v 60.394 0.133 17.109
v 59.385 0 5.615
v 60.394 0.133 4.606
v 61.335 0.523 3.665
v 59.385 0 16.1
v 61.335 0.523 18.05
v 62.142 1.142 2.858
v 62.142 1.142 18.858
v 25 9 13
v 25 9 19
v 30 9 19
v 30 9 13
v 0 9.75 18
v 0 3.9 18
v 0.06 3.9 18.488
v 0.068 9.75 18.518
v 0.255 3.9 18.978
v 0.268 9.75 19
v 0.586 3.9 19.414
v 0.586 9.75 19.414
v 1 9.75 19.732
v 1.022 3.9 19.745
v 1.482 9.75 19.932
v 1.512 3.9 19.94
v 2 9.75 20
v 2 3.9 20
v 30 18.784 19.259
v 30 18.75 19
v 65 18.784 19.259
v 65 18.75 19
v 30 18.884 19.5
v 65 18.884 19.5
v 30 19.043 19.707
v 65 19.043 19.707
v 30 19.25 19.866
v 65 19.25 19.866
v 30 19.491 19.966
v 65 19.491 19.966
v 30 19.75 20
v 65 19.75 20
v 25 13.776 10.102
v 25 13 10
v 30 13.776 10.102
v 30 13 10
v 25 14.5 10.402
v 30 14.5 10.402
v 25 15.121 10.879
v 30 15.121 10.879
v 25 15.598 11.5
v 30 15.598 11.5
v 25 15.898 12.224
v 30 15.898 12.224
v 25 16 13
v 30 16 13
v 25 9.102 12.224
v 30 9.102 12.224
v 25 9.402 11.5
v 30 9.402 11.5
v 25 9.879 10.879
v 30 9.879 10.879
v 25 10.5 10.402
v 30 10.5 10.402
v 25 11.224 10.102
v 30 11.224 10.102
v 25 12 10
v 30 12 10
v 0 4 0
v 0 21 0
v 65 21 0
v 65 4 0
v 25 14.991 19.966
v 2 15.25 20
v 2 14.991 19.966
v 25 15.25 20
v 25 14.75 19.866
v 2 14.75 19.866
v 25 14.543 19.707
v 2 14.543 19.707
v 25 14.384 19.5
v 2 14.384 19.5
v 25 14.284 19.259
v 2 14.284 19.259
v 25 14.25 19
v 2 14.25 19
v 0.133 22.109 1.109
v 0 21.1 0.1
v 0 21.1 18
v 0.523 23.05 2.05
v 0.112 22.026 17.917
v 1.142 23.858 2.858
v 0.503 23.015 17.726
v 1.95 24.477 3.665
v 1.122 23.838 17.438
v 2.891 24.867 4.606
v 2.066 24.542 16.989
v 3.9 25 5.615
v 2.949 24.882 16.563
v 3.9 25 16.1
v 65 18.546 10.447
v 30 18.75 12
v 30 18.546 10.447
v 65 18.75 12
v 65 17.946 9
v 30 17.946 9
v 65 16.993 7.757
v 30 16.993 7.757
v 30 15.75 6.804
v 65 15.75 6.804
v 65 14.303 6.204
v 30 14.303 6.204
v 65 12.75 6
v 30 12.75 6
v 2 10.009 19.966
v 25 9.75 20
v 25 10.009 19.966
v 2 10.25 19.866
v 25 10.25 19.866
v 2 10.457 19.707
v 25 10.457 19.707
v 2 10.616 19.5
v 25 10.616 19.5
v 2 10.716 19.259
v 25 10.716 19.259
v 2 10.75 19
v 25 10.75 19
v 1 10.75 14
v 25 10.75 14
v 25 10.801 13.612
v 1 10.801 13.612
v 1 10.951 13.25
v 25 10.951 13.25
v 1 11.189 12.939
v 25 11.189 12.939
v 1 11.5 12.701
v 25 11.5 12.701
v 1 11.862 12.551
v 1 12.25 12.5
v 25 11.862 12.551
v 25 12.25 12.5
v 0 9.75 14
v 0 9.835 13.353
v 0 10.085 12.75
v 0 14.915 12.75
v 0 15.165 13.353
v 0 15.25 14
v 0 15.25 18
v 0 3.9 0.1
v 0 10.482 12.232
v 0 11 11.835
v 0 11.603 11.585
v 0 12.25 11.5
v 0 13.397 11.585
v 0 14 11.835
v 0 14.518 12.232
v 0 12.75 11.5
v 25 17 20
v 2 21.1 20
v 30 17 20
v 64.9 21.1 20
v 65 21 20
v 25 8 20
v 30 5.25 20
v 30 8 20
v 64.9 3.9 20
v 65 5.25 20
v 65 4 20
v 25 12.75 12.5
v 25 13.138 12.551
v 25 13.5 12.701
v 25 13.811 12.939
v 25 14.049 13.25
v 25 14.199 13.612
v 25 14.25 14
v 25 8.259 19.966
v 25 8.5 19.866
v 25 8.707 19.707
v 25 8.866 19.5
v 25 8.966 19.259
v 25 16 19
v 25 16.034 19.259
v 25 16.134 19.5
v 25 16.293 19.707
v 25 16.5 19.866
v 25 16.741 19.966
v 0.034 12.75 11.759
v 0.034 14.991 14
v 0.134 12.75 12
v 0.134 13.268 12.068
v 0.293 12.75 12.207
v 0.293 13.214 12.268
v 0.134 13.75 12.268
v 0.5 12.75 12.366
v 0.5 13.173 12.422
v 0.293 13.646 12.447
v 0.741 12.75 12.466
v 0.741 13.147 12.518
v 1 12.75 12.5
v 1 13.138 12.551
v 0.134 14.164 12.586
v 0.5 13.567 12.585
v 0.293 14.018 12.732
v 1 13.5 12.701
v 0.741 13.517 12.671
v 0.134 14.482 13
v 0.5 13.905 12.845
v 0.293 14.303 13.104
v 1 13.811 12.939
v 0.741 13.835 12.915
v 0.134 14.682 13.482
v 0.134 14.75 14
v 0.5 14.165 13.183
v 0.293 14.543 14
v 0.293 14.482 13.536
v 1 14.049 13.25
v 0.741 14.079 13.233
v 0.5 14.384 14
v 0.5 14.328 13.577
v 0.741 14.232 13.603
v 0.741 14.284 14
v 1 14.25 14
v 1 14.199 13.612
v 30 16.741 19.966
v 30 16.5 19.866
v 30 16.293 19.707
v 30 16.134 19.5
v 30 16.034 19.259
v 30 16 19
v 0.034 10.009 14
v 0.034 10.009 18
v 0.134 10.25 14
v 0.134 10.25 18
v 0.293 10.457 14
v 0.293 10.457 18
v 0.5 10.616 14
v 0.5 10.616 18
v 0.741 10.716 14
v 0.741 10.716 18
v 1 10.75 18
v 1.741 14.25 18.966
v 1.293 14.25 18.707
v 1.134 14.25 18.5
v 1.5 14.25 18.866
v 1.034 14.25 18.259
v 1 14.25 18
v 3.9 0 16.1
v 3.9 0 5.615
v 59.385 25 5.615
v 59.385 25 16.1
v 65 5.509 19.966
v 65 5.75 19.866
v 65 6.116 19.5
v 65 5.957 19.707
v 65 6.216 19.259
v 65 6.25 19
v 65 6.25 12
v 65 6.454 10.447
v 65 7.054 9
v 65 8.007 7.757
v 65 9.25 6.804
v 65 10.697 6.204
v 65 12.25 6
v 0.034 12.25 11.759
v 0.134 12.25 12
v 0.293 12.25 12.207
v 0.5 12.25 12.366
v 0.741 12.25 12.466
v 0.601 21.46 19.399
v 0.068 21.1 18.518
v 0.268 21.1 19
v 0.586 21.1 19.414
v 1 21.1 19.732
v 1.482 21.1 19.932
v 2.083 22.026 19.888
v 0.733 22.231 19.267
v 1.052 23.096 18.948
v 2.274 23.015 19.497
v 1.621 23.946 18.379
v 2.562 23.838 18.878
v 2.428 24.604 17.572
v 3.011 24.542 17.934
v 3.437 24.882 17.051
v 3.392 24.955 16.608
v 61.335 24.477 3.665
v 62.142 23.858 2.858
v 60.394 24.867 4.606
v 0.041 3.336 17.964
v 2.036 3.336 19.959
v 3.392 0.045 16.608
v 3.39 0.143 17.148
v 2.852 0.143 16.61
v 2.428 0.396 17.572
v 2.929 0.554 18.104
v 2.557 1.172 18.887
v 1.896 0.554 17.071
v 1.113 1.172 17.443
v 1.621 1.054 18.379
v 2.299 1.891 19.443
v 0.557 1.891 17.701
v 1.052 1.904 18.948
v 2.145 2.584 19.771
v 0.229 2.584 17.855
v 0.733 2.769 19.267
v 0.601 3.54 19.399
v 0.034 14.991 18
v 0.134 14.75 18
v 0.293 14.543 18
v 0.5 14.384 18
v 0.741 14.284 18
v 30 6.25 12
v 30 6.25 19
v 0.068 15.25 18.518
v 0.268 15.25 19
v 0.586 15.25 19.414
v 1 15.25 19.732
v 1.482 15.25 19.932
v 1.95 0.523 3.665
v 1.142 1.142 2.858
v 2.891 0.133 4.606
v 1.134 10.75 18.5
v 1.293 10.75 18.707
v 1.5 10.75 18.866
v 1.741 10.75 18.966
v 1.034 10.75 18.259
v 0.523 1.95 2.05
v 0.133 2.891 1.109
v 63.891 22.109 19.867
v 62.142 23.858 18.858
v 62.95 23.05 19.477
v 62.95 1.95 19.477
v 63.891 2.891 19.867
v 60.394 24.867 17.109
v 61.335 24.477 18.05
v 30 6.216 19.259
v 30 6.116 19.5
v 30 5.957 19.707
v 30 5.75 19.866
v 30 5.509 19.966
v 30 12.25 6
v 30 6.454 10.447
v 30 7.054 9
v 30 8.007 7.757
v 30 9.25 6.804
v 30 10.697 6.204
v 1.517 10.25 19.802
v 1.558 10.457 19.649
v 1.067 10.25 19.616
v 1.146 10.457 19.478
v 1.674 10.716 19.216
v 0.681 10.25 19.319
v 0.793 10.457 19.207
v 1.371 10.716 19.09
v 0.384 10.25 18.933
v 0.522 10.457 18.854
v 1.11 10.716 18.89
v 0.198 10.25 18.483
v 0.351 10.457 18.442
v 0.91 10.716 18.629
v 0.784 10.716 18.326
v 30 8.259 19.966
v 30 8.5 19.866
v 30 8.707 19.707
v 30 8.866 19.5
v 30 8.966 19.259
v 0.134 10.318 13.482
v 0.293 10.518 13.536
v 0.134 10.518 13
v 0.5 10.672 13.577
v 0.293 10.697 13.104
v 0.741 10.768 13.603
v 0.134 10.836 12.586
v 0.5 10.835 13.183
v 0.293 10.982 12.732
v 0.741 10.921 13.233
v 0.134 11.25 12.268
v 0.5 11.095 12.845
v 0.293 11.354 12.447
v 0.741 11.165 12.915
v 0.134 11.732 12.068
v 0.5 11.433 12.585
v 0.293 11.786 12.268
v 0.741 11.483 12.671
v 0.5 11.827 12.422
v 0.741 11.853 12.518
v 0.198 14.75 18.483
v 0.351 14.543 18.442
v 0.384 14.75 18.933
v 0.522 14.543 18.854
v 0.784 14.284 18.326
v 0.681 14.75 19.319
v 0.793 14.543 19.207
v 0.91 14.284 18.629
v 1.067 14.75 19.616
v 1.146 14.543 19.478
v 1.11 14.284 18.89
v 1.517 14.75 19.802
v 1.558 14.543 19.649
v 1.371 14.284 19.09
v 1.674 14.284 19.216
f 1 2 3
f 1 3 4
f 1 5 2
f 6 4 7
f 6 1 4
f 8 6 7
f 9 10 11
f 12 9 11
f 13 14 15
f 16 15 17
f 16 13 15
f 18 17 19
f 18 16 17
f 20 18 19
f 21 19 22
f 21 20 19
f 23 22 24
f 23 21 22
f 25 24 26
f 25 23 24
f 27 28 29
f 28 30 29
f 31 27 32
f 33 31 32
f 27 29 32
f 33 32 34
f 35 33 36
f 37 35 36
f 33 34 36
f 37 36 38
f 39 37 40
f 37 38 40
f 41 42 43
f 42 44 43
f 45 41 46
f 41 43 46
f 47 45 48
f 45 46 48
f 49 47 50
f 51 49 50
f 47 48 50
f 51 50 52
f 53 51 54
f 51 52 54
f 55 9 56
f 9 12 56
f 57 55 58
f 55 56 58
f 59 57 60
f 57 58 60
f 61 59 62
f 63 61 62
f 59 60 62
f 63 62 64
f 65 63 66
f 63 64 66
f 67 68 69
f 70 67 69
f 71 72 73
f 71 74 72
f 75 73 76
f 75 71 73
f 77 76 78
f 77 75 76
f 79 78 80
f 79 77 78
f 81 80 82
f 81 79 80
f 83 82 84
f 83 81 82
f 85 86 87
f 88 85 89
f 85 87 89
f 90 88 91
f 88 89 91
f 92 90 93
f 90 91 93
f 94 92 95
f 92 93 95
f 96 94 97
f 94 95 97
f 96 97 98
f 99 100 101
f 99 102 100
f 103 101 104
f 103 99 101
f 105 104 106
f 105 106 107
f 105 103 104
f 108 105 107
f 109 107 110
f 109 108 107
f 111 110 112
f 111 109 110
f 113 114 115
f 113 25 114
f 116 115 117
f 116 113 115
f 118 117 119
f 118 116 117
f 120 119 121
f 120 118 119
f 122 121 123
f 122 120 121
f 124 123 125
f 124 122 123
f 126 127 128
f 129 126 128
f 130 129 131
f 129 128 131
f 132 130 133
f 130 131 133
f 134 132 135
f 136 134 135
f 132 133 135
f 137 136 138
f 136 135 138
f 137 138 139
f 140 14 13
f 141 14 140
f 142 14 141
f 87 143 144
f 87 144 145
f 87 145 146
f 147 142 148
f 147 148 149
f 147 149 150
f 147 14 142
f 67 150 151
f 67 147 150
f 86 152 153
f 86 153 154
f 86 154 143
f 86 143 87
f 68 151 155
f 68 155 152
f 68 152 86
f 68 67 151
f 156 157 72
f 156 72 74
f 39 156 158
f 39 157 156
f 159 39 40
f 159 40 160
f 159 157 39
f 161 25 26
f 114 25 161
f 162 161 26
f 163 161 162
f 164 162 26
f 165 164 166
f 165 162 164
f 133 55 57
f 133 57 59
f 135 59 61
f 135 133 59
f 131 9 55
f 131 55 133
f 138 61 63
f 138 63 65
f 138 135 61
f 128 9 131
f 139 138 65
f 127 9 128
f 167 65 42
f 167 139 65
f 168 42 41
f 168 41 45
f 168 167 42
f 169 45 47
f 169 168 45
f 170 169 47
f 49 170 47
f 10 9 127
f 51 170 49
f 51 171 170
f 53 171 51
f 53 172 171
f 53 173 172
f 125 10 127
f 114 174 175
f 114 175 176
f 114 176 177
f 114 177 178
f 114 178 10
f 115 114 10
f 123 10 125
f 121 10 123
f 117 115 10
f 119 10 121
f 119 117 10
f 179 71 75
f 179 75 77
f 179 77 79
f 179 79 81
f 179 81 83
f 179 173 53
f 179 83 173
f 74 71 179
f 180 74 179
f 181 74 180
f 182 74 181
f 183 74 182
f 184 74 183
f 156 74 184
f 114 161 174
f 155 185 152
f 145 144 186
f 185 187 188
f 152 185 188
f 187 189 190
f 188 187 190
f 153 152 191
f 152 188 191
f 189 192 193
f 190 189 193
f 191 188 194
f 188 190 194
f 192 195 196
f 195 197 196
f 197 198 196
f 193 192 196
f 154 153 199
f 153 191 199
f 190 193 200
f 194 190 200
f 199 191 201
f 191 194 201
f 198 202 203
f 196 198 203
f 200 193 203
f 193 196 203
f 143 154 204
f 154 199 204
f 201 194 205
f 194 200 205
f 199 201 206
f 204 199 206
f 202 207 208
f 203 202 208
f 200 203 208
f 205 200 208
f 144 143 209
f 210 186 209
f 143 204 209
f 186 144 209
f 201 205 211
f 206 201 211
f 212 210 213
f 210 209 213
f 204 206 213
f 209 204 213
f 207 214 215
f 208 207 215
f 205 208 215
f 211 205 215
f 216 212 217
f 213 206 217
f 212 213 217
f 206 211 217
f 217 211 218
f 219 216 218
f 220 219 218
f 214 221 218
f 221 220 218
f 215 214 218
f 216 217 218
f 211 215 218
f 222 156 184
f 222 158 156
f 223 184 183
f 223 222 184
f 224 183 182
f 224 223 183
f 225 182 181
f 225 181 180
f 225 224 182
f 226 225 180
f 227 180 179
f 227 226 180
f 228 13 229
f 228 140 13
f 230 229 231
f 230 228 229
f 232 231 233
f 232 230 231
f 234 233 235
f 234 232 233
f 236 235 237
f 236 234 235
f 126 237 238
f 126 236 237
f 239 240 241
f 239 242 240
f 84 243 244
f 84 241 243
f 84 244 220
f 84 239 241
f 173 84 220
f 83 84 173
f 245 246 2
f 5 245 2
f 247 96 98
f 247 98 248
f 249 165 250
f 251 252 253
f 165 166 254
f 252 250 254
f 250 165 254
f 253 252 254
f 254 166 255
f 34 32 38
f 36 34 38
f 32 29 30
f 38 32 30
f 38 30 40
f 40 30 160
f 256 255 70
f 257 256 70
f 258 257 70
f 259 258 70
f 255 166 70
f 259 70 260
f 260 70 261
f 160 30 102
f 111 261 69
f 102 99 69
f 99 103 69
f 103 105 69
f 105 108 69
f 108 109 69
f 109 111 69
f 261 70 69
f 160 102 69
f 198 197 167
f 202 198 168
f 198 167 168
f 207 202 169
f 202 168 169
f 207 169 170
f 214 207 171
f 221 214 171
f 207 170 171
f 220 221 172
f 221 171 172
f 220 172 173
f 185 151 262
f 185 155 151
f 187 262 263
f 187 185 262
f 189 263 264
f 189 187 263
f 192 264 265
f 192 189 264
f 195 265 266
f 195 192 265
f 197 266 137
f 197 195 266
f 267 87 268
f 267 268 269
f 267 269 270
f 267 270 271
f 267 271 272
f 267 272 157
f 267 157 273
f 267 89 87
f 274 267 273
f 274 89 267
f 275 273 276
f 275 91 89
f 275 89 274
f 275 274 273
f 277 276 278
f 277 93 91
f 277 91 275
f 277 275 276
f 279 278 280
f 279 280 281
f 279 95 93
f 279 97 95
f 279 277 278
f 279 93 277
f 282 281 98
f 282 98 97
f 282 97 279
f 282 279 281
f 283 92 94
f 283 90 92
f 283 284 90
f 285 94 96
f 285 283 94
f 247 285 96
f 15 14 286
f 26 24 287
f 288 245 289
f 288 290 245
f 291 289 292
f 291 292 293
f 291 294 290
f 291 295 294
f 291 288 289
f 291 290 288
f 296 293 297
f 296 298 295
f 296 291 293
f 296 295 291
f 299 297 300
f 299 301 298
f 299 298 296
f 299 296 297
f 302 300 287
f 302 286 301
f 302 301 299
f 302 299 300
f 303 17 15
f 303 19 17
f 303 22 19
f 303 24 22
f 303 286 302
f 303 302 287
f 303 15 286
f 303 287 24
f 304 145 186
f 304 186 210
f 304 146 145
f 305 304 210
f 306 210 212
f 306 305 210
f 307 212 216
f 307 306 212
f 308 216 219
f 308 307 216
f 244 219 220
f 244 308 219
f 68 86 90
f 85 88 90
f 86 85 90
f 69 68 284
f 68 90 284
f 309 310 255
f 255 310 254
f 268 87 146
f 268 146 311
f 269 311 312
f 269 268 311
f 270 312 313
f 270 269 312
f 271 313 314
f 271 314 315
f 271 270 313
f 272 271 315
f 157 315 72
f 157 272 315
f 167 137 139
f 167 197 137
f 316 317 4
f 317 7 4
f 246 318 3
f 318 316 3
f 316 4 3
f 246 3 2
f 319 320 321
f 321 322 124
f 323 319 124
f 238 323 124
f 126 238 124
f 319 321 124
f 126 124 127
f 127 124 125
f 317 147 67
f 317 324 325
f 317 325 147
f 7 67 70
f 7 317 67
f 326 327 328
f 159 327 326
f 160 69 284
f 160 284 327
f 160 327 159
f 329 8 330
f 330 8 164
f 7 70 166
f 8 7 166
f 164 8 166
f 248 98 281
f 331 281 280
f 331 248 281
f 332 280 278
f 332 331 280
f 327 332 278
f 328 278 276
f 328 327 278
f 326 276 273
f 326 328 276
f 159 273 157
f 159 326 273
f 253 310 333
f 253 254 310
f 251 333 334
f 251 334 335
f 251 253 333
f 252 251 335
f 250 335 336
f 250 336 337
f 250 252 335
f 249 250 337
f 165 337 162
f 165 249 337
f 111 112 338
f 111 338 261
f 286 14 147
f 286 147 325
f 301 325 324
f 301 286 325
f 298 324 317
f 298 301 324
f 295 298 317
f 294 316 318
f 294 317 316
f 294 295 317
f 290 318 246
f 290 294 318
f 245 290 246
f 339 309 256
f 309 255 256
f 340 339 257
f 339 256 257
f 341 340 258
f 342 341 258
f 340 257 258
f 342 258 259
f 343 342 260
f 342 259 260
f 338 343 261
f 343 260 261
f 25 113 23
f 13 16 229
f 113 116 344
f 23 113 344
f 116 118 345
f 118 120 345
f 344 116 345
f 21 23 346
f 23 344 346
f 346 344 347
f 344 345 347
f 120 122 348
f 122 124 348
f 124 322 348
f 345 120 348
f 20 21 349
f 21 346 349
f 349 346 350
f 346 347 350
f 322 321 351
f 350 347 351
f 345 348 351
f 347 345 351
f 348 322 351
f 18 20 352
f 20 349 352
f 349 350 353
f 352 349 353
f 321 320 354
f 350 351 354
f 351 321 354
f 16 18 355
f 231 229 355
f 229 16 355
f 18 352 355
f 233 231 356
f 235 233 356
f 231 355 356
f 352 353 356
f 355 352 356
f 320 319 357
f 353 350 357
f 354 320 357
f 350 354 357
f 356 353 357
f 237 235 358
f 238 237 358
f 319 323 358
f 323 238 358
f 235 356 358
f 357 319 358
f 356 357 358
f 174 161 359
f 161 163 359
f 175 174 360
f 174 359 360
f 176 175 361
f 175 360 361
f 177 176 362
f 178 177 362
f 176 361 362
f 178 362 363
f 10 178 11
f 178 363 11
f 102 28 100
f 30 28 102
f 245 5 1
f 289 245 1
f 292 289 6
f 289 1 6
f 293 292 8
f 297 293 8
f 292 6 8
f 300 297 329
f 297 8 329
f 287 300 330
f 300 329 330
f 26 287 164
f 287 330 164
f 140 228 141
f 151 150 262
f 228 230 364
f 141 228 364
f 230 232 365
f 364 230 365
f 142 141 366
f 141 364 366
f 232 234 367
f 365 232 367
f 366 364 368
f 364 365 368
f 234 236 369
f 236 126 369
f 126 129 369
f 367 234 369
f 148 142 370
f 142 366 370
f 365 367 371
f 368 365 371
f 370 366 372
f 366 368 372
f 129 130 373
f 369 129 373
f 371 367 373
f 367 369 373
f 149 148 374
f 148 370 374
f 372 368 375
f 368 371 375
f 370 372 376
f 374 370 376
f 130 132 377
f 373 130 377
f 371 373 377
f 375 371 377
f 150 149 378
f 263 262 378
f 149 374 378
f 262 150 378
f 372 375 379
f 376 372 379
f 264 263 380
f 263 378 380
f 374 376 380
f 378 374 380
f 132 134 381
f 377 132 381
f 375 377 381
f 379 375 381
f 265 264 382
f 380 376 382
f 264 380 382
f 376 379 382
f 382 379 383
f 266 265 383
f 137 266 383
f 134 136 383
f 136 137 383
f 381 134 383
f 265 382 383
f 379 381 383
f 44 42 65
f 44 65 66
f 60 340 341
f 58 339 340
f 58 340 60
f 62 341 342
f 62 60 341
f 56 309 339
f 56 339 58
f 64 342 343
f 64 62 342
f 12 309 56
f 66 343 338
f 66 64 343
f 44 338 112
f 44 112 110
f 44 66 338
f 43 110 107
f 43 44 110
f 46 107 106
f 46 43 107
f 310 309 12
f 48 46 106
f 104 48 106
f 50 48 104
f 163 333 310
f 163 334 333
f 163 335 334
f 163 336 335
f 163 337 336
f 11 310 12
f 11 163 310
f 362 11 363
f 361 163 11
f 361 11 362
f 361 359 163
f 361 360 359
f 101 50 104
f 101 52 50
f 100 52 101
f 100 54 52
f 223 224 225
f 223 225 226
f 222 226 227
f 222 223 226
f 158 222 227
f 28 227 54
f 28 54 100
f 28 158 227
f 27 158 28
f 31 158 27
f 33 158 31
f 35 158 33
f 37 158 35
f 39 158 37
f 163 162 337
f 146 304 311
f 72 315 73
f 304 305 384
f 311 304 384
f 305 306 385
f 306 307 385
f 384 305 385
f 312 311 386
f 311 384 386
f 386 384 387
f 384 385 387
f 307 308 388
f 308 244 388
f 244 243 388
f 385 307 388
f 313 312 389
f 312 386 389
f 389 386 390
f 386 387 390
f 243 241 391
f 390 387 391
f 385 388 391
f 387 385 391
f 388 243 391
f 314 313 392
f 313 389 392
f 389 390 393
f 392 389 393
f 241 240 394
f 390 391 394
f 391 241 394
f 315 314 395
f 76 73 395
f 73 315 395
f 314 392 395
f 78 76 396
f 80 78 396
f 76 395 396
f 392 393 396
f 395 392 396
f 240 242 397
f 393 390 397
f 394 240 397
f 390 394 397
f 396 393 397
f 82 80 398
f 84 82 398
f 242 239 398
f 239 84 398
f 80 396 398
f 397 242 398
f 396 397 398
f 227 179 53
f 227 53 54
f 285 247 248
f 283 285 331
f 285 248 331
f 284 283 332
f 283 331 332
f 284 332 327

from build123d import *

# Parameters (mm, degrees)
SKETCH_W        = 65
SKETCH_H        = 25
PAD_DEPTH       = 20
SKETCH001_W     = 65
SKETCH001_H     = 3.5
POCKET_DEPTH    = 7.5
SKETCH002_W     = 40
SKETCH002_H     = 7
POCKET001_DEPTH = 10
SKETCH003_W     = 35
SKETCH003_H     = 12.5
POCKET002_DEPTH = 14
CHAMFER_SIZE    = 4
CHAMFER001_SIZE = 4
FILLET_R        = 3.9
FILLET001_R     = 2
FILLET002_R     = 1.5
FILLET003_R     = 3
FILLET004_R     = 6
FILLET005_R     = 1


with BuildPart() as part:
    # Sketch → Pad (new body)
    with BuildSketch(Plane.XY):
        with Locations((32.5, 12.5)):
            Rectangle(SKETCH_W, SKETCH_H)
    extrude(amount=PAD_DEPTH)

    # Sketch001 → Pocket (cut)
    with BuildSketch(Plane.XY.offset(20)):
        with Locations((32.5, 12.5)):
            Rectangle(SKETCH001_W, SKETCH001_H)
    extrude(amount=-POCKET_DEPTH, mode=Mode.SUBTRACT)

    # Sketch002 → Pocket001 (cut)
    with BuildSketch(Plane.XY.offset(20)):
        with Locations((45, 12.5)):
            Rectangle(SKETCH002_W, SKETCH002_H)
    extrude(amount=-POCKET001_DEPTH, mode=Mode.SUBTRACT)

    # Sketch003 → Pocket002 (cut)
    with BuildSketch(Plane.XY.offset(20)):
        with Locations((47.5, 12.5)):
            Rectangle(SKETCH003_W, SKETCH003_H)
    extrude(amount=-POCKET002_DEPTH, mode=Mode.SUBTRACT)

    # Chamfer
    chamfer_edges = [part.edges().sort_by_distance(p)[0] for p in [
        (65, 25, 10),
        (65, 0, 10),
    ]]
    chamfer(chamfer_edges, length=CHAMFER_SIZE)

    # Chamfer001
    chamfer001_edges = [part.edges().sort_by_distance(p)[0] for p in [
        (30.5, 0, 0),
        (30.5, 25, 0),
    ]]
    chamfer(chamfer001_edges, length=CHAMFER001_SIZE)

    # Fillet
    fillet_edges = [part.edges().sort_by_distance(p)[0] for p in [
        (61, 0, 12),
        (30.5, 0, 4),
        (30.5, 0, 20),
        (0, 0, 12),
        (61, 25, 12),
        (30.5, 25, 4),
        (30.5, 25, 20),
        (0, 25, 12),
    ]]
    fillet(fillet_edges, radius=FILLET_R)

    # Fillet001
    fillet001_edges = [part.edges().sort_by_distance(p)[0] for p in [
        (0, 7.325, 20),
        (0, 17.675, 20),
    ]]
    fillet(fillet001_edges, radius=FILLET001_R)

    # Fillet002
    fillet002_edges = [part.edges().sort_by_distance(p)[0] for p in [
        (12.5, 14.25, 12.5),
        (12.5, 10.75, 12.5),
    ]]
    fillet(fillet002_edges, radius=FILLET002_R)

    # Fillet003
    fillet003_edges = [part.edges().sort_by_distance(p)[0] for p in [
        (27.5, 9, 10),
        (27.5, 16, 10),
    ]]
    fillet(fillet003_edges, radius=FILLET003_R)

    # Fillet004
    fillet004_edges = [part.edges().sort_by_distance(p)[0] for p in [
        (47.5, 18.75, 6),
        (47.5, 6.25, 6),
    ]]
    fillet(fillet004_edges, radius=FILLET004_R)

    # Fillet005
    fillet005_edges = [part.edges().sort_by_distance(p)[0] for p in [
        (13.5, 14.25, 20),
        (13.5, 10.75, 20),
        (27.5, 16, 20),
        (27.5, 9, 20),
        (47.5, 18.75, 20),
        (47.5, 6.25, 20),
    ]]
    fillet(fillet005_edges, radius=FILLET005_R)


solid = part.part
